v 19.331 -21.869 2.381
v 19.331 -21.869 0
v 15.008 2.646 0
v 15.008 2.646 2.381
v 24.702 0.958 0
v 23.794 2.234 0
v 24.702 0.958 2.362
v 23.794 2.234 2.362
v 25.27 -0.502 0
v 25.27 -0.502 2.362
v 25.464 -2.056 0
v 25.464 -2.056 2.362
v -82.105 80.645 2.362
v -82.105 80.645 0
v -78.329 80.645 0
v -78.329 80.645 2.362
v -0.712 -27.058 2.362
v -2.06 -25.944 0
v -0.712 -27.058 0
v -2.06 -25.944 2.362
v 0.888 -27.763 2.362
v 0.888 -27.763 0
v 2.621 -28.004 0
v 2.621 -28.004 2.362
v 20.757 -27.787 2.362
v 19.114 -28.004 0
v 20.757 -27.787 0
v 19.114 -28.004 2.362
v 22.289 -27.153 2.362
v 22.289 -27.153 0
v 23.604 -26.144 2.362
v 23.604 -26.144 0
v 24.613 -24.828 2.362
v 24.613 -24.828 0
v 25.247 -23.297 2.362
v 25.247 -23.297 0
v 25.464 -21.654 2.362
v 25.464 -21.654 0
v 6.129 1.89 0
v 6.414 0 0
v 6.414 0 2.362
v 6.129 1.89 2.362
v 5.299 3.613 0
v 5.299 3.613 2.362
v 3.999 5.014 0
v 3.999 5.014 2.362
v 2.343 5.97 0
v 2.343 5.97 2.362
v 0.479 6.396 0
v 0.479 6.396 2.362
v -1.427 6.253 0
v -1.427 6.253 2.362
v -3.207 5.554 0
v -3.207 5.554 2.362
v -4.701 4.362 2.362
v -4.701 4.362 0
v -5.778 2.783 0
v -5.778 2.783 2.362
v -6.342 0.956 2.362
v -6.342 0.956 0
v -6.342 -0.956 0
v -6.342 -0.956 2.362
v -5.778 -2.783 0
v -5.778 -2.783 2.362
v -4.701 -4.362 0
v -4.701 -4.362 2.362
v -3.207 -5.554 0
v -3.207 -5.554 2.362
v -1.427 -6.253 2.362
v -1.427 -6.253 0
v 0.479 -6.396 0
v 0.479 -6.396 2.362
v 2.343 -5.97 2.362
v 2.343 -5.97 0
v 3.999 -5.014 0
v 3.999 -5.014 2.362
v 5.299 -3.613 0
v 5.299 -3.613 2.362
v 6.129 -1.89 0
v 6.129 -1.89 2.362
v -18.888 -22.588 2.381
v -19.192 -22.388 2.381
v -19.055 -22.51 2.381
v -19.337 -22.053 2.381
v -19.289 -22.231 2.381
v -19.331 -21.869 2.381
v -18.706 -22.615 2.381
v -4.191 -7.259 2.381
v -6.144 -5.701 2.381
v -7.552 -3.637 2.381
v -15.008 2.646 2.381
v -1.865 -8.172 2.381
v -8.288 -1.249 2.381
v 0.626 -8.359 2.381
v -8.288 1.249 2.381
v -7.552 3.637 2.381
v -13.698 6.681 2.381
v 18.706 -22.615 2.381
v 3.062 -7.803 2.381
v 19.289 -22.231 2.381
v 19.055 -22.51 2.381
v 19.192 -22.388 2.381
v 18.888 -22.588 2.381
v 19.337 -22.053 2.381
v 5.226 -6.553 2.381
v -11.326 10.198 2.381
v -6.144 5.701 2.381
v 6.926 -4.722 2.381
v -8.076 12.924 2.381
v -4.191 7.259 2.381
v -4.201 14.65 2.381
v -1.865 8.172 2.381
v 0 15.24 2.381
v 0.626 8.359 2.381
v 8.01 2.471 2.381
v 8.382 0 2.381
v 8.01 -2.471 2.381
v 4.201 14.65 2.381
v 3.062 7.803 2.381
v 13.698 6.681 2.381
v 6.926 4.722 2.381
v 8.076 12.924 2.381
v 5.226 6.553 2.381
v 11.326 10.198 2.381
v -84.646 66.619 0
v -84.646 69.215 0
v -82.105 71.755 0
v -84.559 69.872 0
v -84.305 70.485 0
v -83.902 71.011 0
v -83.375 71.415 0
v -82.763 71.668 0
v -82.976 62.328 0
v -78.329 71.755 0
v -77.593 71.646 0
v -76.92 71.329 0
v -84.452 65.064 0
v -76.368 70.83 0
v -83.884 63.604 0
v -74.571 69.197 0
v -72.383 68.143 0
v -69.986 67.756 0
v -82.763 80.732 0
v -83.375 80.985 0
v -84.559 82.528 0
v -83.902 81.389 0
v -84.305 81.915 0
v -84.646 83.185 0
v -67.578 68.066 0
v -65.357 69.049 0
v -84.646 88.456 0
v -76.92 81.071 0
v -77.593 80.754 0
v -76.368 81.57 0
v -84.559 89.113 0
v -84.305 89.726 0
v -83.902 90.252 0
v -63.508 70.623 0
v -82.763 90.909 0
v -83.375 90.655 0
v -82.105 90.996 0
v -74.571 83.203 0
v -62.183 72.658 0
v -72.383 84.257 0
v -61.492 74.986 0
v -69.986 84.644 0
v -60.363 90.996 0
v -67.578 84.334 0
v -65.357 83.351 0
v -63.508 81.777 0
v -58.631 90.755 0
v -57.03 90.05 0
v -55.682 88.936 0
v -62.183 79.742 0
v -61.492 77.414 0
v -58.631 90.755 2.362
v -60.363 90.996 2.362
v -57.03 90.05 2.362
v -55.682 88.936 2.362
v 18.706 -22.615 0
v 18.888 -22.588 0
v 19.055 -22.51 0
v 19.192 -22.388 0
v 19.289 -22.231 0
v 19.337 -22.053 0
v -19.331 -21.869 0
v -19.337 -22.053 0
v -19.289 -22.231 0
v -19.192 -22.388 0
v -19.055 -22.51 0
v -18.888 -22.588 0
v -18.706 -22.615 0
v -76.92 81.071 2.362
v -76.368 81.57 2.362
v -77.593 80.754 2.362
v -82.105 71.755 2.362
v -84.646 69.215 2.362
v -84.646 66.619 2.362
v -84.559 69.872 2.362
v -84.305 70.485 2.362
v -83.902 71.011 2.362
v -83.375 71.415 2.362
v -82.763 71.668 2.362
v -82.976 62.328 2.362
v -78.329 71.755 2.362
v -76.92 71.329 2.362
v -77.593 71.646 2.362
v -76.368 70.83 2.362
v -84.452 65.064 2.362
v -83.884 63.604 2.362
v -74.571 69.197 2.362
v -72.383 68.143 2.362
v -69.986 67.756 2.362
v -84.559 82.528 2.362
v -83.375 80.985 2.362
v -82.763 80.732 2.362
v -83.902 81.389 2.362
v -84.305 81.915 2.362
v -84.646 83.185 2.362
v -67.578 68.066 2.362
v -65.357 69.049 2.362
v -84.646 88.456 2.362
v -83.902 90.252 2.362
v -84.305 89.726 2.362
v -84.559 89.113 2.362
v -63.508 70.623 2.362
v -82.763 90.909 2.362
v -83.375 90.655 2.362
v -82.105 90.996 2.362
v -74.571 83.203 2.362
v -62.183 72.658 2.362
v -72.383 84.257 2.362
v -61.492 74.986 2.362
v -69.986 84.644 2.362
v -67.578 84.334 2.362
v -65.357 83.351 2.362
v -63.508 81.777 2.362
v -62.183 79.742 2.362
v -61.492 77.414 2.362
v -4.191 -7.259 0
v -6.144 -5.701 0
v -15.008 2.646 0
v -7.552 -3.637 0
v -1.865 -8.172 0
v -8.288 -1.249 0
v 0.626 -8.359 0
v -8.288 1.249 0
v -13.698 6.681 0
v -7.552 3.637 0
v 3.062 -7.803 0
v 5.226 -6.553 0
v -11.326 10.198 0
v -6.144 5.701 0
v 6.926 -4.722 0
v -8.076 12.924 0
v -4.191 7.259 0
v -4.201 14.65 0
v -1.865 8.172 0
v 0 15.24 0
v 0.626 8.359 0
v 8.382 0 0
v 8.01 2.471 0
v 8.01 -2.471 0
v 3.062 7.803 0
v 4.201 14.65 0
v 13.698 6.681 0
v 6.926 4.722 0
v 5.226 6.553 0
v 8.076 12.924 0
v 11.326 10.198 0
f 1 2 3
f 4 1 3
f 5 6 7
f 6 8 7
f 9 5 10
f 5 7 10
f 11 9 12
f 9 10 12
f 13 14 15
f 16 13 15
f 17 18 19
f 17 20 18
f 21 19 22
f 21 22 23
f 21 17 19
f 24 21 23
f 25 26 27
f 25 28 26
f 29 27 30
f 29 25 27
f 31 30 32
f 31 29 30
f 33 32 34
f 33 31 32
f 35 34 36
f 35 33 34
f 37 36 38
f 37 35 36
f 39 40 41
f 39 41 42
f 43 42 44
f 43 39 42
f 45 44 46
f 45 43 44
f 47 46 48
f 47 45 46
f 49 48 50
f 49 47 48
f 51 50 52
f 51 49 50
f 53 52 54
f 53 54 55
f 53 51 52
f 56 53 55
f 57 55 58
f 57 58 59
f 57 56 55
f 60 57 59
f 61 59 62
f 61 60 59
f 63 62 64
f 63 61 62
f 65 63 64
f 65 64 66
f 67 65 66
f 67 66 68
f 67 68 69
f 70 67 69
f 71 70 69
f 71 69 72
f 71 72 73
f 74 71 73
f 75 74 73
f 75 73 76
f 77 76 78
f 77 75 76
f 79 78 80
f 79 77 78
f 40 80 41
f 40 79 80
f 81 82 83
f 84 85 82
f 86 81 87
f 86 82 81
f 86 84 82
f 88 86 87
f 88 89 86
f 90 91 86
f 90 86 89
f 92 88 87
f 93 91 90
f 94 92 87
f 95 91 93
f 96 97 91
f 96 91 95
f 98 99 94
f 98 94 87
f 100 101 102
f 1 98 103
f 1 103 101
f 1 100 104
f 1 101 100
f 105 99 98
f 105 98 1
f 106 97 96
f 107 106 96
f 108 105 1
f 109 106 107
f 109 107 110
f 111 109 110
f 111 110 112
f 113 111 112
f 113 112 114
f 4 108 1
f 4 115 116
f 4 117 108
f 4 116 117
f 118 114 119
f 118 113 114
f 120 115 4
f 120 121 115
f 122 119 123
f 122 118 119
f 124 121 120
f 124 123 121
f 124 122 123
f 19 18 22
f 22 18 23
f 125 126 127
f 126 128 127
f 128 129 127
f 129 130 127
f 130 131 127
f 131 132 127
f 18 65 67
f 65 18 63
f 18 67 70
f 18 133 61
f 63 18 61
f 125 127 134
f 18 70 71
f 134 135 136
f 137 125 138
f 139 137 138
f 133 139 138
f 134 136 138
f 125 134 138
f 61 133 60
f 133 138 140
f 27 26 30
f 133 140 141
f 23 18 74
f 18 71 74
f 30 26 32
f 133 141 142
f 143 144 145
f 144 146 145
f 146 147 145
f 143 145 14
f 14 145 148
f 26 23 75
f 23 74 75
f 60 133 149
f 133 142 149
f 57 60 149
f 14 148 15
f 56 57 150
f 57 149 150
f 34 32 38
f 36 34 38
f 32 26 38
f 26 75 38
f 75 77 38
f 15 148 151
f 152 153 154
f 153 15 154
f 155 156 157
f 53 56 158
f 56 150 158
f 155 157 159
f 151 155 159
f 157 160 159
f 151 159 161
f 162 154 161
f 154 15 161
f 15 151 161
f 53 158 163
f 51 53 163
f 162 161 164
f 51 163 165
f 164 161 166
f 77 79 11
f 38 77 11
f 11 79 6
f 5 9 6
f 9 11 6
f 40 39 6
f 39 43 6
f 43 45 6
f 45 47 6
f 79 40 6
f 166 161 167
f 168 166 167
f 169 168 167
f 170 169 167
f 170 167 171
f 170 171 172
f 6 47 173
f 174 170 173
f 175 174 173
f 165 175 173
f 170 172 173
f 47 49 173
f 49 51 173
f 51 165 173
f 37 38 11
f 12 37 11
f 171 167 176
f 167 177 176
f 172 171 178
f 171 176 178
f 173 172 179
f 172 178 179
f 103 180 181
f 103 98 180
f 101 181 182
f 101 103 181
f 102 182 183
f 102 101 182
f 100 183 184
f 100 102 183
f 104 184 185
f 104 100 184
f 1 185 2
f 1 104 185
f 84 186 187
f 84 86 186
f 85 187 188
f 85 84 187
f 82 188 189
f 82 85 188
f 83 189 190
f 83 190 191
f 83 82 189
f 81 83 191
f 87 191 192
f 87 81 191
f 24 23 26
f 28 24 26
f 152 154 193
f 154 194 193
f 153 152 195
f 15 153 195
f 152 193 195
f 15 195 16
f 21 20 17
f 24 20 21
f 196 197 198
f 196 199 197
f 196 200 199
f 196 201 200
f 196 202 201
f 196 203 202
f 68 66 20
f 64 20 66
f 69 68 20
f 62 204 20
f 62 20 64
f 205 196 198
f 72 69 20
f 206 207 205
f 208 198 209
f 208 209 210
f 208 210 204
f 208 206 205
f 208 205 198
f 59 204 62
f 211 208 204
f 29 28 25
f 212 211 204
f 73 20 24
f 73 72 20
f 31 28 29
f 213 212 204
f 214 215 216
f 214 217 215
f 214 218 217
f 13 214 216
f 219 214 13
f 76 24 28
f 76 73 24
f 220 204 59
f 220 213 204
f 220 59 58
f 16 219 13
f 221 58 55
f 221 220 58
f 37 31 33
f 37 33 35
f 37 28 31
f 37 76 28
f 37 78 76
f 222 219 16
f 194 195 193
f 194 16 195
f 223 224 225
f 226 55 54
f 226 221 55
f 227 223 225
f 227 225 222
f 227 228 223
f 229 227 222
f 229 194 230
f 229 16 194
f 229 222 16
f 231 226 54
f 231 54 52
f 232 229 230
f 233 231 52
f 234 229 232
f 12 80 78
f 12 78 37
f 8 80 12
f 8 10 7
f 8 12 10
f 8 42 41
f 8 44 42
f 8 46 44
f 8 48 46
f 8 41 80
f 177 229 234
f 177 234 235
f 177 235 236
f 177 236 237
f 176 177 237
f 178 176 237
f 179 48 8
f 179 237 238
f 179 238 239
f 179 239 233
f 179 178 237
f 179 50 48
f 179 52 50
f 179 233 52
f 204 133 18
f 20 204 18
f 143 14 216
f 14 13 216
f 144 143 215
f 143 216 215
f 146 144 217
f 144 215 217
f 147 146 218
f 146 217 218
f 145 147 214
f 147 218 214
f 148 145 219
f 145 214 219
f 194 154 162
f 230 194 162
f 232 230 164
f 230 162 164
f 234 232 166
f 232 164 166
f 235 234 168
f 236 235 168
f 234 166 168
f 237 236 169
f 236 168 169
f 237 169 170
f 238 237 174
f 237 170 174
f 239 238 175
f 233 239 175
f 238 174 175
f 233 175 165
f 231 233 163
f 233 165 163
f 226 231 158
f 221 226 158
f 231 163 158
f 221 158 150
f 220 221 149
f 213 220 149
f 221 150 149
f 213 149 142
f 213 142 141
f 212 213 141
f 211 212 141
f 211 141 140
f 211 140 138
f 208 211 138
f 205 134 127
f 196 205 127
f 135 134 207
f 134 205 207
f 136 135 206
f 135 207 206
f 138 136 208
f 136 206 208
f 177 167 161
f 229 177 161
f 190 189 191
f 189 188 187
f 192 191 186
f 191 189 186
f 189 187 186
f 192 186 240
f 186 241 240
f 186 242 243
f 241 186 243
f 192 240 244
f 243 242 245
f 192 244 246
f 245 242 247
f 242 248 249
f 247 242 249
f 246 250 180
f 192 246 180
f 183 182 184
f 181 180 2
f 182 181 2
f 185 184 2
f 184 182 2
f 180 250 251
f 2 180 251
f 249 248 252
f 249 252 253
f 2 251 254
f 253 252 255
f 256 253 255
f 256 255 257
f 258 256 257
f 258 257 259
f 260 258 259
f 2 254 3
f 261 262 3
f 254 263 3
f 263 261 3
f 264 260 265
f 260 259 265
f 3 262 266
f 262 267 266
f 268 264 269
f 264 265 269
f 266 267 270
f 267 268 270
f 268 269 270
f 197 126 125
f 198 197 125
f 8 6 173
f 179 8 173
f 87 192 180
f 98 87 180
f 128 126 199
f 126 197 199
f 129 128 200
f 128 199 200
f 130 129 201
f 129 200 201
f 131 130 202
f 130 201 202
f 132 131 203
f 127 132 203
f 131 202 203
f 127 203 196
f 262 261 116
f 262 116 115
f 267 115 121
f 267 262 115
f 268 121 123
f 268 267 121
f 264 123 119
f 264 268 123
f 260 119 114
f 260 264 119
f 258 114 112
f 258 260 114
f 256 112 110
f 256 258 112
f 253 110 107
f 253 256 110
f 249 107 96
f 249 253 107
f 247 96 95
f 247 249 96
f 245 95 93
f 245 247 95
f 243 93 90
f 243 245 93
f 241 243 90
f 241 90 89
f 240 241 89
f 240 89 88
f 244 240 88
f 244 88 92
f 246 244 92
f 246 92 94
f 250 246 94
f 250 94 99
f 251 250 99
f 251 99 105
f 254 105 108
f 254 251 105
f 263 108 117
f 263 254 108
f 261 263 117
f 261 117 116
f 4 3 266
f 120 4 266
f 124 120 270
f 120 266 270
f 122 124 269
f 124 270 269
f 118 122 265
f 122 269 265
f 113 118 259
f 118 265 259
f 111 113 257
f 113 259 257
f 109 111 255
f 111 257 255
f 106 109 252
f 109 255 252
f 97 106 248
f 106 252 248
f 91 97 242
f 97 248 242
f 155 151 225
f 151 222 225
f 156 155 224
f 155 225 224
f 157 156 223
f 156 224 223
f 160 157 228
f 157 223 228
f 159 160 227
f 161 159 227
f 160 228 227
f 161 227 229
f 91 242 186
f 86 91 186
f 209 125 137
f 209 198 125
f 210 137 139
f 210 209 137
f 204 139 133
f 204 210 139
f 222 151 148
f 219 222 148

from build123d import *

# Parameters (mm, degrees)
F0_R     = 8.382
F1_DEPTH = 2.38125
F2_R     = 0.635
F3_R     = 6.4135
F4_DEPTH = 2.3622
F5_R     = 6.35
F6_R     = 2.54


# Not quite as in the source:
# - a feature names something its author has since deleted; it is built from what else it names


with BuildPart() as f1:
    # F0 (on Top) → F1 (new body)
    with BuildSketch(Plane.XY):
        with BuildLine():
            ThreePointArc((-15.24, 0), (0, -15.24), (15.24, 0))
            ThreePointArc((15.24, 0), (15.1820071989, 1.3282535195), (15.0084701559, 2.6463982276))
            ThreePointArc((15.0084701559, 2.6463982276), (0, 15.24), (-15.0084701559, 2.6463982276))
            ThreePointArc((-15.0084701559, 2.6463982276), (-15.1820071989, 1.3282535195), (-15.24, 0))
        make_face()
        Circle(F0_R, mode=Mode.SUBTRACT)
        with BuildLine():
            ThreePointArc((15.0084701559, 2.6463982276), (15.1820071989, 1.3282535195), (15.24, 0))
            ThreePointArc((15.24, 0), (0, -15.24), (-15.24, 0))
            ThreePointArc((-15.24, 0), (-15.1820071989, 1.3282535195), (-15.0084701559, 2.6463982276))
            Line((-15.0084701559, 2.6463982276), (-19.4626723496, -22.6146376946))
            ThreePointArc((-19.4626723496, -22.6146376946), (0, -17.78), (19.4626723496, -22.6146376946))
            Line((19.4626723496, -22.6146376946), (15.0084701559, 2.6463982276))
        make_face()
        with BuildLine():
            Line((-19.4626723496, -22.6146376946), (19.4626723496, -22.6146376946))
            ThreePointArc((19.4626723496, -22.6146376946), (0, -17.78), (-19.4626723496, -22.6146376946))
        make_face()
    extrude(amount=F1_DEPTH)

    # F2
    f2_edges = [f1.edges().sort_by_distance(p)[0] for p in [
        (-19.462672, -22.614638, 1.190625),
        (19.462672, -22.614638, 1.190625),
    ]]
    fillet(f2_edges, radius=F2_R)


with BuildPart() as f4:
    # F3 (on Top) → F4 (new body)
    with BuildSketch(Plane.XY):
        with BuildLine():
            ThreePointArc((-77.0311172703, 80.645), (-61.4045, 76.2), (-77.0311172703, 71.755))
            Line((-77.0311172703, 71.755), (-84.6455, 71.755))
            Line((-84.6455, 71.755), (-84.6455, 64.1485879677))
            Line((-84.6455, 64.1485879677), (-0.1727526963, -28.0035))
            Line((-0.1727526963, -28.0035), (25.4635, -28.0035))
            Line((25.4635, -28.0035), (25.4635, 0.4135938505))
            Line((25.4635, 0.4135938505), (-57.5699139704, 90.9955))
            Line((-57.5699139704, 90.9955), (-84.6455, 90.9955))
            Line((-84.6455, 90.9955), (-84.6455, 80.645))
            Line((-84.6455, 80.645), (-77.0311172703, 80.645))
        make_face()
        Circle(F3_R, mode=Mode.SUBTRACT)
    extrude(amount=F4_DEPTH)

    # F5
    f5_edges = [f4.edges().sort_by_distance(p)[0] for p in [
        (-57.569914, 90.9955, 1.1811),
        (25.4635, 0.413594, 1.1811),
        (25.4635, -28.0035, 1.1811),
        (-0.172753, -28.0035, 1.1811),
        (-84.6455, 64.148588, 1.1811),
    ]]
    fillet(f5_edges, radius=F5_R)

    # F6
    f6_edges = [f4.edges().sort_by_distance(p)[0] for p in [
        (-84.6455, 80.645, 1.1811),
        (-84.6455, 71.755, 1.1811),
        (-84.6455, 90.9955, 1.1811),
        (-77.031117, 80.645, 1.1811),
        (-77.031117, 71.755, 1.1811),
    ]]
    fillet(f6_edges, radius=F6_R)


solid = Compound([f1.part, f4.part])
